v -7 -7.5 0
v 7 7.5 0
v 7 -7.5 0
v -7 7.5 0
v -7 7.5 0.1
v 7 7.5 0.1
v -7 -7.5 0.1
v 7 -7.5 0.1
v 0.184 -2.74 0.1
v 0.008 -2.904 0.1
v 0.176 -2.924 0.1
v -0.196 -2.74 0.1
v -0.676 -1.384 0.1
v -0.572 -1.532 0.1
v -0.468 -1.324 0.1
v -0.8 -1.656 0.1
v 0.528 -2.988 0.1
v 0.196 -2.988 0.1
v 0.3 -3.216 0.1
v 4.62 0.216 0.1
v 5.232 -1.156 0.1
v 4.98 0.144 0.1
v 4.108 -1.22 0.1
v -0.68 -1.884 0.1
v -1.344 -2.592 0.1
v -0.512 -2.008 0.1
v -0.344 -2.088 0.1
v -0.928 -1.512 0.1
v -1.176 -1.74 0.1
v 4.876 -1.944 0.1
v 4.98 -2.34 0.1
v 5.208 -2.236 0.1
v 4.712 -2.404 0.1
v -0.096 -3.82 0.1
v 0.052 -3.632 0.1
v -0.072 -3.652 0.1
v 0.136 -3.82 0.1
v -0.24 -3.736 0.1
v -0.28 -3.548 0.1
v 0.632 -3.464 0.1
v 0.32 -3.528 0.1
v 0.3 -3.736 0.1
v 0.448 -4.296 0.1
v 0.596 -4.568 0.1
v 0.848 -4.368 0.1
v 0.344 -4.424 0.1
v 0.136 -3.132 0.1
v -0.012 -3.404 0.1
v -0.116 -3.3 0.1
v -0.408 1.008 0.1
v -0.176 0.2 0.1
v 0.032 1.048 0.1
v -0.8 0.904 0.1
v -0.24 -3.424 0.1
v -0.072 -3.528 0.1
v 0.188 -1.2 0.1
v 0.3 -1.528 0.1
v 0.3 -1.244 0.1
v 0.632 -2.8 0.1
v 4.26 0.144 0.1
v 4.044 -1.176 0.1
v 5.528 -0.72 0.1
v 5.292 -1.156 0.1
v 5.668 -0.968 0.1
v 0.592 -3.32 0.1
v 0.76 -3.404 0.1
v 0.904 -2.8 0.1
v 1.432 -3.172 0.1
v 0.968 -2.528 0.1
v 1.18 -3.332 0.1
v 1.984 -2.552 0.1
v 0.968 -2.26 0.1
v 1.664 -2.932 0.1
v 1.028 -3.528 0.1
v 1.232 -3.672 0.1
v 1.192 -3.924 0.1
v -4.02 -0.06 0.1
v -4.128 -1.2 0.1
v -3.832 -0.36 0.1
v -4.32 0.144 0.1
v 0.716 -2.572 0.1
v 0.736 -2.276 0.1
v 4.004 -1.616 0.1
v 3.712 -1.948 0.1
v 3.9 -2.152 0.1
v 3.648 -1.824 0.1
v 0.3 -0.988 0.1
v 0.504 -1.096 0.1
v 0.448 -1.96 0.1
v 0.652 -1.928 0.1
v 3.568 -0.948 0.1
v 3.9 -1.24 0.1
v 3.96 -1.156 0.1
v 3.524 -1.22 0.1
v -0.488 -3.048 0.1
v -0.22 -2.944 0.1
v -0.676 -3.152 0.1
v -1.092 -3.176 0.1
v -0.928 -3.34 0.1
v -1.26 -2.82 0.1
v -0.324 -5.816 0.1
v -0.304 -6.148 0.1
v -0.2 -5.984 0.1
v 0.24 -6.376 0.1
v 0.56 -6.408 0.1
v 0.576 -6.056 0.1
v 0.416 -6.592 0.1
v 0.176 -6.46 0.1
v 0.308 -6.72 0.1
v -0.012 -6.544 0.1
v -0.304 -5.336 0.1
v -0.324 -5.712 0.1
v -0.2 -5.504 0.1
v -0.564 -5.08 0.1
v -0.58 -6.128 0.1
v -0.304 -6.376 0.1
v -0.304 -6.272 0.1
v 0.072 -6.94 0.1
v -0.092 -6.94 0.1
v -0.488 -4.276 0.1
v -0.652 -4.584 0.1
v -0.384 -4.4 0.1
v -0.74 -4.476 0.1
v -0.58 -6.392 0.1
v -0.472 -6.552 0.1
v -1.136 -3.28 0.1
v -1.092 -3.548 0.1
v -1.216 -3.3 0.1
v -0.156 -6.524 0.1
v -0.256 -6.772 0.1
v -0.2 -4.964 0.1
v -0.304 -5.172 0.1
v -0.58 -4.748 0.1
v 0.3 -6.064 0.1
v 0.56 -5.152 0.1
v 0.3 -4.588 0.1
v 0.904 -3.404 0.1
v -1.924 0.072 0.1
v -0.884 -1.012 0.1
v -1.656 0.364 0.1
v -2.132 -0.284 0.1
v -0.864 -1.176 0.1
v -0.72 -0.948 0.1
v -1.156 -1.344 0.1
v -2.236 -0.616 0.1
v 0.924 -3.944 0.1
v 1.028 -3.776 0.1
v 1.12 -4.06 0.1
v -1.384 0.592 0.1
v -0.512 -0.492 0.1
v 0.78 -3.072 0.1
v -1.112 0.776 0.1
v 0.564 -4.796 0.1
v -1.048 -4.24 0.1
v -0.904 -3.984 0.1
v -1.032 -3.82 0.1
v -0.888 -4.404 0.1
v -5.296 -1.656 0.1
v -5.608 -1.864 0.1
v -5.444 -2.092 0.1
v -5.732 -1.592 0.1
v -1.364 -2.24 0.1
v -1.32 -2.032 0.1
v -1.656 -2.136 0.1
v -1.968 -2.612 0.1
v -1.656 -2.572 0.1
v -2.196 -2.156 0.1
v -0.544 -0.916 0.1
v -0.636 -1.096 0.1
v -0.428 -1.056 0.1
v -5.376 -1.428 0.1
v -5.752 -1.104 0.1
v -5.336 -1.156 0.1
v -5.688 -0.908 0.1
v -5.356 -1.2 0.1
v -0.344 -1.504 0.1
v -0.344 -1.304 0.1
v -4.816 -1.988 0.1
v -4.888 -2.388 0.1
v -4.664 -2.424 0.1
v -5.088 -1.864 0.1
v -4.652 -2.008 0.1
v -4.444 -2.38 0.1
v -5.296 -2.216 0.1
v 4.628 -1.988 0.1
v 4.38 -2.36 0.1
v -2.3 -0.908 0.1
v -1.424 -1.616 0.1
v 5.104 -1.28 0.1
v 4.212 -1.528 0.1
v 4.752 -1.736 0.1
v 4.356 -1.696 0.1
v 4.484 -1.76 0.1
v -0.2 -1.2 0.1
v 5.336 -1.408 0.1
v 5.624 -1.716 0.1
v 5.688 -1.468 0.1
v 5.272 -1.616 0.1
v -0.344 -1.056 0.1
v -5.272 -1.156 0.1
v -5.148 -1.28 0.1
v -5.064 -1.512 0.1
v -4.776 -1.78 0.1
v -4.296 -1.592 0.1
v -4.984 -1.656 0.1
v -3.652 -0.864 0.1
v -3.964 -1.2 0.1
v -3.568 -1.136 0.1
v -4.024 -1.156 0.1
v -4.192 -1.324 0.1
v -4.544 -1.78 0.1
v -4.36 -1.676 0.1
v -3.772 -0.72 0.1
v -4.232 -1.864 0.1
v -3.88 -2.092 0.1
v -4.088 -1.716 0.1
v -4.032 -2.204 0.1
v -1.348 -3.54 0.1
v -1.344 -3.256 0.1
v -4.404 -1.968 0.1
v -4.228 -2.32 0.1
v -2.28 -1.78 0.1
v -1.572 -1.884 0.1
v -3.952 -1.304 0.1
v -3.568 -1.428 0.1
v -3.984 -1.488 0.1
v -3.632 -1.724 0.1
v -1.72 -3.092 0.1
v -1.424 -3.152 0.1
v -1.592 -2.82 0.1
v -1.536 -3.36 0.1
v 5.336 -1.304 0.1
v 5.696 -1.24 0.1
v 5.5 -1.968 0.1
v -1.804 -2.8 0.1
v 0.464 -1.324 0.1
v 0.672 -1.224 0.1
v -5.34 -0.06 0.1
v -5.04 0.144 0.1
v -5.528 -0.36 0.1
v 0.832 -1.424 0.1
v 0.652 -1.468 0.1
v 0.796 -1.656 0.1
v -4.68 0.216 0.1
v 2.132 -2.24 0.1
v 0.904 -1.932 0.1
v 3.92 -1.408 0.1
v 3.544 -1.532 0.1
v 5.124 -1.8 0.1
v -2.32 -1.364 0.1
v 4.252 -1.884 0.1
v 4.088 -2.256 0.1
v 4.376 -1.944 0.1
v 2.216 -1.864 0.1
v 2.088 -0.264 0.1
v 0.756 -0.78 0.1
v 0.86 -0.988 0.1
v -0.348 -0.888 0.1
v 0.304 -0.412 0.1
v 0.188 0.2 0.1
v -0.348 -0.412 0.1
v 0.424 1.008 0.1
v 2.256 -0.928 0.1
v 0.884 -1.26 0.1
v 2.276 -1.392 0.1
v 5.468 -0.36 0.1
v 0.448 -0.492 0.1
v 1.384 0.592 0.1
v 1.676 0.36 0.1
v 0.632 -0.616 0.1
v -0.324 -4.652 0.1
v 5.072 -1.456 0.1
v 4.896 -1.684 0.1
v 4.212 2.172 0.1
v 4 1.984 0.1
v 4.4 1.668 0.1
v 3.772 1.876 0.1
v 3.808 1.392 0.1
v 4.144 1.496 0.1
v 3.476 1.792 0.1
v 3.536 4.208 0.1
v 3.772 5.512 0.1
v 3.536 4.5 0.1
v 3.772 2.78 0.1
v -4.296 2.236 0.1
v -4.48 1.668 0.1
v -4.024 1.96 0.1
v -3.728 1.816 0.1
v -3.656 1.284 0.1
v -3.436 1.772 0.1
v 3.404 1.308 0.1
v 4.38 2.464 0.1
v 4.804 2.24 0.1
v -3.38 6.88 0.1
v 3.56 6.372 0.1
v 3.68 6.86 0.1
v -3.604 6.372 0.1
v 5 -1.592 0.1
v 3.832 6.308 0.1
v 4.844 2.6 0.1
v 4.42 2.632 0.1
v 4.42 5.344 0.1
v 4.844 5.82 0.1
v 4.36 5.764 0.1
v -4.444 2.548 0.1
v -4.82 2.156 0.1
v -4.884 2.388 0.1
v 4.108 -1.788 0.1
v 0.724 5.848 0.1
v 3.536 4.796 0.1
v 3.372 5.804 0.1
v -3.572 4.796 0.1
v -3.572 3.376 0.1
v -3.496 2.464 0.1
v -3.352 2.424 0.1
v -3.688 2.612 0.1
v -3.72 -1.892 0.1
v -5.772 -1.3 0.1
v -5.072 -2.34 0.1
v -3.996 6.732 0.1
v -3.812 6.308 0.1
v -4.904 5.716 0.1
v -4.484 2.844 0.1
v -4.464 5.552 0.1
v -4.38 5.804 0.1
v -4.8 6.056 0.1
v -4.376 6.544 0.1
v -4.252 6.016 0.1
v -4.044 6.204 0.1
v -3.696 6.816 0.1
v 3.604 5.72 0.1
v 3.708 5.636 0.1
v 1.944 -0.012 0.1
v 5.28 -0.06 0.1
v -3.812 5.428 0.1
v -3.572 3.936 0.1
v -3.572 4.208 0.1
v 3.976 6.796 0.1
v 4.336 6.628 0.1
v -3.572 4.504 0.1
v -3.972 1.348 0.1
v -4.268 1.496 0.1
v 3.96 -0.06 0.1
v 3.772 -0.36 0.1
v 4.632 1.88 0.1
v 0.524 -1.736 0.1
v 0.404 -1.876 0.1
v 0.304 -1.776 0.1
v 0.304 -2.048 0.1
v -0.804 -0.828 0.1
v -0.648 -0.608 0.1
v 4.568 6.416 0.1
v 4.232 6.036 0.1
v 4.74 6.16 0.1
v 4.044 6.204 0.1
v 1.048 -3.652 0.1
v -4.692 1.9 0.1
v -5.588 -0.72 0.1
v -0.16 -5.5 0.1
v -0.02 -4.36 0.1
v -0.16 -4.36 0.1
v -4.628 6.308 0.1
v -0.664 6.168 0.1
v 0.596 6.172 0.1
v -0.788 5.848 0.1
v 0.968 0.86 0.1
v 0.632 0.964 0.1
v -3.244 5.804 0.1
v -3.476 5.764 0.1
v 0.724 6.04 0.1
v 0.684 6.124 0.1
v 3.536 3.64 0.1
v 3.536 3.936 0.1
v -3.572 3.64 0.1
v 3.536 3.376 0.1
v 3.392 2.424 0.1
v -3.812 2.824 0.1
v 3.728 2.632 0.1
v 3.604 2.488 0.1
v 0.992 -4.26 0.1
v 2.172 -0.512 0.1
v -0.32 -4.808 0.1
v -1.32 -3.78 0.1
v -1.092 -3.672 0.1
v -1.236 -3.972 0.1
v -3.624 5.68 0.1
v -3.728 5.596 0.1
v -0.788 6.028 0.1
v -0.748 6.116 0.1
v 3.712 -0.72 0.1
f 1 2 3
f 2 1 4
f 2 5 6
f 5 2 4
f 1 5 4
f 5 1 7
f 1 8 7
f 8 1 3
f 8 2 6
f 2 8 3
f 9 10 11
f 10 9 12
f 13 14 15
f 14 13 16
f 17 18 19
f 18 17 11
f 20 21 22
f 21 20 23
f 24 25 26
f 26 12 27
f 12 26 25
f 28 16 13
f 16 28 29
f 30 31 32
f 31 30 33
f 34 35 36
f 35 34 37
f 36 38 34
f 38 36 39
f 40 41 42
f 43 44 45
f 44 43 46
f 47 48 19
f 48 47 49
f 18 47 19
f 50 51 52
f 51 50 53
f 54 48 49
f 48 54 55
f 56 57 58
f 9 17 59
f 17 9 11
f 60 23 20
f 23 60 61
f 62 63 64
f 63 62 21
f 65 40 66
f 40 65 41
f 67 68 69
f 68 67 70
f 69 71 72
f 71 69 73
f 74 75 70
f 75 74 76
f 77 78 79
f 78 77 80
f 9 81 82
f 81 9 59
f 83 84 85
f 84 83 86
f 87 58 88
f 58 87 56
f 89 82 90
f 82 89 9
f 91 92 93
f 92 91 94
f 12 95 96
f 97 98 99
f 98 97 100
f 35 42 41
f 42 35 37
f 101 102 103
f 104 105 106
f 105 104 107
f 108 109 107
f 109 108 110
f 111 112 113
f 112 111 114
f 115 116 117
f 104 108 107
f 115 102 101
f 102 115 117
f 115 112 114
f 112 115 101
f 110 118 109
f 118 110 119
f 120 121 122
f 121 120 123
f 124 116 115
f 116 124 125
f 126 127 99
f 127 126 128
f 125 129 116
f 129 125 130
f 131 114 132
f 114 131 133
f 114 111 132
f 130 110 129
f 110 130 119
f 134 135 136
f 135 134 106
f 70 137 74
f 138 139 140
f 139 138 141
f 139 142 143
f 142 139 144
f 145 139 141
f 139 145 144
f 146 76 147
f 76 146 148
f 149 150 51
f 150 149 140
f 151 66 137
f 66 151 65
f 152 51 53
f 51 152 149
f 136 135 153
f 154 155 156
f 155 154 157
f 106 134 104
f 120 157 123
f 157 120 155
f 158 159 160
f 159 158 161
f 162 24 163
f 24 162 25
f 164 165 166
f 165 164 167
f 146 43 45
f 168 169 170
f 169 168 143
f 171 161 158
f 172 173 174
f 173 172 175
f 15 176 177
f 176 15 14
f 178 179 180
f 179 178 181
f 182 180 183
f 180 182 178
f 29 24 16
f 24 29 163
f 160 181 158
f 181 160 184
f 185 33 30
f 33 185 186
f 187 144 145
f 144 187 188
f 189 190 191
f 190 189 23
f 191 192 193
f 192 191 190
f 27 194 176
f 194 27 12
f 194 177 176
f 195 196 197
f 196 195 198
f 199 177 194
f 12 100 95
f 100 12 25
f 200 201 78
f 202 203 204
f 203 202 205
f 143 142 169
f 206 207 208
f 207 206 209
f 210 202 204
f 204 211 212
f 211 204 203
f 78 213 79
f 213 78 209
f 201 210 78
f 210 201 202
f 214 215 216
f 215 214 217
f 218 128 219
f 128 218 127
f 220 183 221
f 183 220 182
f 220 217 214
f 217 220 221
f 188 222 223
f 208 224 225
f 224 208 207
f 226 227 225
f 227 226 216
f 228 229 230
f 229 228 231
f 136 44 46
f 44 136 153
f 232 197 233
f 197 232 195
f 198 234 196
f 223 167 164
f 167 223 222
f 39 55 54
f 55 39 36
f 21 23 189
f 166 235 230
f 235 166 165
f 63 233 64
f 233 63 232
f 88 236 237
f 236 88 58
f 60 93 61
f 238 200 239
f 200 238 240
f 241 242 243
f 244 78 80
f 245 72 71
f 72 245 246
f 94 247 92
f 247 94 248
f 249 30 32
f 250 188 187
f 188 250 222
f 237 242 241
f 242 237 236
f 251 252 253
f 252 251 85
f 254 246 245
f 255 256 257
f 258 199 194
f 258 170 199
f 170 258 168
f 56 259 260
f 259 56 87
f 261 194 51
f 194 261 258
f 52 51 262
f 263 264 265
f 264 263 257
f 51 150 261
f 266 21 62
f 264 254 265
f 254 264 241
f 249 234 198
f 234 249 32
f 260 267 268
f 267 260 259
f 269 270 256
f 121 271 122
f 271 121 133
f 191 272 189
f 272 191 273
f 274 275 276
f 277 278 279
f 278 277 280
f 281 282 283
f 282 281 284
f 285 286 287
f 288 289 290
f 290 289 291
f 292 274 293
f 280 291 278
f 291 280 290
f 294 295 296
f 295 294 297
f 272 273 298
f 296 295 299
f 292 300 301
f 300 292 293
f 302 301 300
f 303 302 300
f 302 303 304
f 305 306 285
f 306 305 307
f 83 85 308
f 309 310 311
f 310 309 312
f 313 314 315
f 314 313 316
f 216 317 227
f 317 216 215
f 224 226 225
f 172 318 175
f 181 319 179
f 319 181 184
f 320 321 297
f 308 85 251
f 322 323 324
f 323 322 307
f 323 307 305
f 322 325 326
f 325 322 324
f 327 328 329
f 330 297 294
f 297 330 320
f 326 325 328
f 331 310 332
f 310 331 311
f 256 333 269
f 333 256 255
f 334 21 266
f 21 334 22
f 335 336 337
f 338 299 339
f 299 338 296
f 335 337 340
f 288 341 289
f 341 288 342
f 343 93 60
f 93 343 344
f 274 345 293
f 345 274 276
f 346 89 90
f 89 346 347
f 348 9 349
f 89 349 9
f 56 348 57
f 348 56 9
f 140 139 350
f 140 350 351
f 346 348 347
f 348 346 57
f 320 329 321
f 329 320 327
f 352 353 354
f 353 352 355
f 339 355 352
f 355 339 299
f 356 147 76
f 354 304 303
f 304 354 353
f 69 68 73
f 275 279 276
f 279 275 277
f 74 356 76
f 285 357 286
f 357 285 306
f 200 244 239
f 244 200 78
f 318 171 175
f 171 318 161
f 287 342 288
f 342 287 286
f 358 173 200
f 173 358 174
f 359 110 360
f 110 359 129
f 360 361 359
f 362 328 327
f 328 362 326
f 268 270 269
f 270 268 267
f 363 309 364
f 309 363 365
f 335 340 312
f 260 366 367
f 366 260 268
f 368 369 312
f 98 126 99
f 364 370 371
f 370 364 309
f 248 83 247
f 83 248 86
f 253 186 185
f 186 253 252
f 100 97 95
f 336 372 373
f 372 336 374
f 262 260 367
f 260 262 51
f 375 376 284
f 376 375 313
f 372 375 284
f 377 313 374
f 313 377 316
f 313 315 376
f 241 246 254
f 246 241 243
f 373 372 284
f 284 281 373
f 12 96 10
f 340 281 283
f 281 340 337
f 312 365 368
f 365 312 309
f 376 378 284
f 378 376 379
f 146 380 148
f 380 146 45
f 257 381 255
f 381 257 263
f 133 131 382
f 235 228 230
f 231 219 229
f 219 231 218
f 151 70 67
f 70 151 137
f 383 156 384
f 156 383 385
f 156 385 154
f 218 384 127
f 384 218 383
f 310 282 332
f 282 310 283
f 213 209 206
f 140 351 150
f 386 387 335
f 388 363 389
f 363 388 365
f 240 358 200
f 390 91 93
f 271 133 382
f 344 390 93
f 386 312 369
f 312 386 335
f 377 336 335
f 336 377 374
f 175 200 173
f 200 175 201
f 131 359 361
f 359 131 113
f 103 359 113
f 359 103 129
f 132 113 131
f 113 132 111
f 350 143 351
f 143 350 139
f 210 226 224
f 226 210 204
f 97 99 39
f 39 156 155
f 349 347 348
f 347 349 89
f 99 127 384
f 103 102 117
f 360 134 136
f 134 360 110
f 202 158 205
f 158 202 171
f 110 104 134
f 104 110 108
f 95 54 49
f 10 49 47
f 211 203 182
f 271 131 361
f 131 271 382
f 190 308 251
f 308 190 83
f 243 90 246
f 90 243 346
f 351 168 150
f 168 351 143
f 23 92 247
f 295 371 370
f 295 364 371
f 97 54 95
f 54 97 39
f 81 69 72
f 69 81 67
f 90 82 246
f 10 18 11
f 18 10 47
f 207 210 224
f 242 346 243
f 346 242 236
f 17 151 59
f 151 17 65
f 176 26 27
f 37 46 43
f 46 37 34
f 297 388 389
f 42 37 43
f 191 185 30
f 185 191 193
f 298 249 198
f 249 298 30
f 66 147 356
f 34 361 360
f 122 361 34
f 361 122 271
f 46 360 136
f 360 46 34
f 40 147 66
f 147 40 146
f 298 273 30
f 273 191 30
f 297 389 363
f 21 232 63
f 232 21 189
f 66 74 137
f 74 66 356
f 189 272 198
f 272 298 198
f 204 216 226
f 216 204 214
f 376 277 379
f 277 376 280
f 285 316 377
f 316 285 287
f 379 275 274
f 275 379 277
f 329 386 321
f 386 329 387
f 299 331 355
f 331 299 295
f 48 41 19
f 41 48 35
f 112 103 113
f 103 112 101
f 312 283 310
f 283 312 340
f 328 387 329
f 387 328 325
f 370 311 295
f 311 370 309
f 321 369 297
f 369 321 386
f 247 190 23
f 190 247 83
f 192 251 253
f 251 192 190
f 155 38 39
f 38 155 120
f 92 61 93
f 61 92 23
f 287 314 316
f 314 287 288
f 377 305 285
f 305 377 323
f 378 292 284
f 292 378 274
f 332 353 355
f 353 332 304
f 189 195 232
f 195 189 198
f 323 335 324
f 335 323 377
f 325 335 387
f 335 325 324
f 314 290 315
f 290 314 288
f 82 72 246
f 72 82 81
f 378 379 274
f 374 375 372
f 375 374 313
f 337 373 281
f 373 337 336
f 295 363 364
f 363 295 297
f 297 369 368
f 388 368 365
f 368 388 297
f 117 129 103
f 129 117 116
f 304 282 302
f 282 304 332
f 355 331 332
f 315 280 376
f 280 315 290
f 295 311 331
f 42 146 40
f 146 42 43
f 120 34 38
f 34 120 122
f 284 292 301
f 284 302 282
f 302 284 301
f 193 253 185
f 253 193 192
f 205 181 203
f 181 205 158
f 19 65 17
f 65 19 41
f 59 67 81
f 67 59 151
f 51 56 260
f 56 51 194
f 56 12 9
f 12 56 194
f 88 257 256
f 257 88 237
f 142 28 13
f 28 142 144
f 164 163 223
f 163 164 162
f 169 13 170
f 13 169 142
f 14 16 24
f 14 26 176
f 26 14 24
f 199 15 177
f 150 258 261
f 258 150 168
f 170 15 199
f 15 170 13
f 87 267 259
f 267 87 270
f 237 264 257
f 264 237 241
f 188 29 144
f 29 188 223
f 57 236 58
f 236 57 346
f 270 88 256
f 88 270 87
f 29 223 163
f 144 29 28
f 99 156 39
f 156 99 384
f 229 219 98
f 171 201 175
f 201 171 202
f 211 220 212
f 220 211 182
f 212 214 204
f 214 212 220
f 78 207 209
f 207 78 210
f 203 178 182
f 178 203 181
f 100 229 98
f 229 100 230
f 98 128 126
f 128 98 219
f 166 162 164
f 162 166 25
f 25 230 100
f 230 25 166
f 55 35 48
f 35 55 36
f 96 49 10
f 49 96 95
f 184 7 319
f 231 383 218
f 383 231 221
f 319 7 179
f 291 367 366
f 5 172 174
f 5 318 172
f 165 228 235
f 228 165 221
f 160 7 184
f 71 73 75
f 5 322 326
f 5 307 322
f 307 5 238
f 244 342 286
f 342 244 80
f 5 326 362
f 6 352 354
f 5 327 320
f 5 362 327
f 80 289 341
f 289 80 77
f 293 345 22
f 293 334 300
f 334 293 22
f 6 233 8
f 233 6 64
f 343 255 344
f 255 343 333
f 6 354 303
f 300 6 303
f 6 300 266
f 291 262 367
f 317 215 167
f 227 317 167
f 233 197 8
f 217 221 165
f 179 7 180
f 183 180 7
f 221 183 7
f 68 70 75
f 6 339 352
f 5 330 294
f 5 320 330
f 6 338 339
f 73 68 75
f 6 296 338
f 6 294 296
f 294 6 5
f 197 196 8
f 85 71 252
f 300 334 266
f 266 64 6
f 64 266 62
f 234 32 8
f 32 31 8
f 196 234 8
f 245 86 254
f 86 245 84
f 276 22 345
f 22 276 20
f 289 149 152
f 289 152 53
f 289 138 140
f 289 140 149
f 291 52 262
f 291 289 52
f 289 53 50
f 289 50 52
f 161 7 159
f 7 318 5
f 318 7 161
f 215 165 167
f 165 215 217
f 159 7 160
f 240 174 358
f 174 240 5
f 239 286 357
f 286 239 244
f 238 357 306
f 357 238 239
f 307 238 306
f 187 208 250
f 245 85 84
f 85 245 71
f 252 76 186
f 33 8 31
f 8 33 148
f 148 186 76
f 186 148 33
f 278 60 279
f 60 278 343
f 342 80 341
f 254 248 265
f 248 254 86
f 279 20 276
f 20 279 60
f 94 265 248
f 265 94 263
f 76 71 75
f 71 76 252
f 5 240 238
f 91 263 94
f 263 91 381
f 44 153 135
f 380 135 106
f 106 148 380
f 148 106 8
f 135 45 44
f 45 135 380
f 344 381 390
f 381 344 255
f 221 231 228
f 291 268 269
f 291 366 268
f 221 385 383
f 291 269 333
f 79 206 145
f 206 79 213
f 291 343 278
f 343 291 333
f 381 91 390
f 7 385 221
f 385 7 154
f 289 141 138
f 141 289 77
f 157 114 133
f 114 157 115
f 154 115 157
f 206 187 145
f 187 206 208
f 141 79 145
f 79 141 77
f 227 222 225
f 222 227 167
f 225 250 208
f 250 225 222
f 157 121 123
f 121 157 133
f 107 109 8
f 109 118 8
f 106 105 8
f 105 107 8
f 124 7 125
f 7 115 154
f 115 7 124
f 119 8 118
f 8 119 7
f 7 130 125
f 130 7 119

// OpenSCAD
use <../lib.scad>
use <../p/box5-12.scad>
use <s/6296256ds01.scad>
function ldraw_lib__6372023d() = [
// 0 Sticker  1.9 x  1.8 with Ignition Key, Switches and Ashtray on Bright Light Blue
// 0 Name: 6372023d.dat
// 0 Author: Magnus Forsberg [MagFors]
// 0 !LDRAW_ORG Part UPDATE 2024-05
// 0 !LICENSE Licensed under CC BY 4.0 : see CAreadme.txt
// 
// 0 BFC CERTIFY CCW
  [0,"BFC","CERTIFY"],
  [0,"BFC","CCW"],
// 
// 0 !KEYWORDS 500, Bricklink 77942stk01, Brickowl 1064764, Cinquecento, FIAT
// 0 !KEYWORDS Nuova, Rebrickable 83460, set 77942
// 
// 0 !HISTORY 2024-06-30 [OrionP] Official Update 2024-05
// 
// 
// 1 16 0 -.25 0 17.5 0 0 0 .25 0 0 0 18.75 box5-12.dat
  [1,16,0,-.25,0,17.5,0,0,0,.25,0,0,0,18.75, ldraw_lib__box5_12()],
// 1 212 0 0 0 1 0 0 0 1 0 0 0 1 s\6296256ds01.dat
  [1,212,0,0,0,1,0,0,0,1,0,0,0,1, ldraw_lib__s__6296256ds01()],
];
module ldraw_lib__6372023d(step=0, col=false, unit=2/5, alt=false, line=0.2, solid=!$preview)
    makepoly(ldraw_lib__6372023d(), step=step, col=col, unit=unit, alt=alt, line=line, solid=solid);
ldraw_lib__6372023d(line=0.2);
